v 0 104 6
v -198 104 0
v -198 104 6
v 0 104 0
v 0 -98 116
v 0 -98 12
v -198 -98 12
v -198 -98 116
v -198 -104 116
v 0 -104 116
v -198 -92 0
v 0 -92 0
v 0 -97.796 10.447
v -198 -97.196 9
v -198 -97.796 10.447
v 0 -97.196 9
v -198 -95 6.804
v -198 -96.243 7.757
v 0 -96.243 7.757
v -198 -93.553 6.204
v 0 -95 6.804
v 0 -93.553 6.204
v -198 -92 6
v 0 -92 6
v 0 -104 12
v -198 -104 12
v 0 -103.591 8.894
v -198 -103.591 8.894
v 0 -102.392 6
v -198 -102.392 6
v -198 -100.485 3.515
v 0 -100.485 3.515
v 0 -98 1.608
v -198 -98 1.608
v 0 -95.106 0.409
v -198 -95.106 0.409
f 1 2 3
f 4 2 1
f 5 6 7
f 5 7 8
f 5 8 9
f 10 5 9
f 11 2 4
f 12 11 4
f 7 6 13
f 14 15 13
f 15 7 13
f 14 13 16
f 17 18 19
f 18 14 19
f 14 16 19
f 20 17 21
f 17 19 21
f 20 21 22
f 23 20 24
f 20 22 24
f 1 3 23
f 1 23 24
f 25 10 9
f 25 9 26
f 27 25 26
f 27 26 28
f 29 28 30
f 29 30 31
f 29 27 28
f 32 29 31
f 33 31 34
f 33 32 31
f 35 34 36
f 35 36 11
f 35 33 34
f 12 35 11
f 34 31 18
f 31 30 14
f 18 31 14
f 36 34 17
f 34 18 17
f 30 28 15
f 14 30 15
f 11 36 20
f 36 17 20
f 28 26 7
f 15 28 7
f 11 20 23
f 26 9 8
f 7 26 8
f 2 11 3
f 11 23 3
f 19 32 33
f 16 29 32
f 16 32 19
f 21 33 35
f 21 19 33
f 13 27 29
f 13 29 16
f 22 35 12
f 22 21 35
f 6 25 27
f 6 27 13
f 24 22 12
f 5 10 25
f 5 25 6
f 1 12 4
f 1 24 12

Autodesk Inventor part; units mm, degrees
ref_plane "YZ Plane" through (0, 0, 0) normal (1, 0, 0) x (0, 1, 0)
ref_plane "XZ Plane" through (0, 0, 0) normal (0, 1, 0) x (-1, 0, 0)
sketch "Sketch2" plane through (0, 0, 0) normal (0, 0, 1) x (1, 0, 0)
  line L0 (0, -104) -> (-198, -104)
  line L1 (-198, -104) -> (-198, 104)
  line L2 (-198, 104) -> (0, 104)
  line L3 (0, 104) -> (0, -104)
  point P0 (0, 99)
  point P1 (0, -99)
  point P2 (0, 0)
  dimension "d29" = 198
  dimension "d30" = 208
  dimension "d31" = 5
  dimension "d32" = 5
extrude "Plate2" add sketch "Sketch2" along normal blind 6
sketch "Sketch5" plane through (0, -98, 0) normal (0, -1, 0) x (1, 0, 0)
  line L0 (-198, 0) -> (0, 0)
  line L1 (0, 0) -> (0, 116)
  line L2 (0, 116) -> (-198, 116)
  line L3 (-198, 116) -> (-198, 0)
edge flange "Flange1" height 116 angle 90 thickness 6 bend radius 6 thickness toward (0, -1, 0) relief round relief width 6 relief depth 3 edges at (-99, -104, 6) wall of the first edge with corners at (-198, -98, 0) (0, -98, 0) (0, -98, 116) (-198, -98, 116)
bend "Bend1"
corner "Corner1"
ref_plane "Work Plane2" through (0, -98, 116) normal (0.5, 0, 0.8660254) x (0, -1, 0)
equation "\"d30\" = ChargingHatch_width"
equation "\"d14\" = Thickness"
equation "\"d34\" = BendReliefWidth"
equation "\"d35\" = BendReliefDepth"
equation "\"d36\" = MinimumRemnant"
equation "\"d37\" = TransitionRadius"
equation "\"d38\" = ChargingHatch_hight - Thickness"
equation "\"d40\" = BendRadius"
equation "\"d41\" = CornerReliefSize"
equation "\"d42\" = GapSize"
equation "\"d43\" = JacobiRadiusSize"
equation "\"d32\" = d31"
equation "\"BendReliefWidth\" = Thickness"
equation "\"BendReliefDepth\" = 0.5 * Thickness"
equation "\"CornerReliefSize\" = 4 * Thickness"
equation "\"MinimumRemnant\" = 2 * Thickness"
equation "\"TransitionRadius\" = BendRadius"
equation "\"JacobiRadiusSize\" = BendRadius"
equation "\"GapSize\" = Thickness"
equation "\"ChargingHatch_width\" = 208"
equation "\"Thickness\" = 6"
equation "\"ChargingHatch_hight\" = 122"
equation "\"BendRadius\" = 6"
properties part number "PRS 9672 charging tube 2_D1200 940" material "Steel"
